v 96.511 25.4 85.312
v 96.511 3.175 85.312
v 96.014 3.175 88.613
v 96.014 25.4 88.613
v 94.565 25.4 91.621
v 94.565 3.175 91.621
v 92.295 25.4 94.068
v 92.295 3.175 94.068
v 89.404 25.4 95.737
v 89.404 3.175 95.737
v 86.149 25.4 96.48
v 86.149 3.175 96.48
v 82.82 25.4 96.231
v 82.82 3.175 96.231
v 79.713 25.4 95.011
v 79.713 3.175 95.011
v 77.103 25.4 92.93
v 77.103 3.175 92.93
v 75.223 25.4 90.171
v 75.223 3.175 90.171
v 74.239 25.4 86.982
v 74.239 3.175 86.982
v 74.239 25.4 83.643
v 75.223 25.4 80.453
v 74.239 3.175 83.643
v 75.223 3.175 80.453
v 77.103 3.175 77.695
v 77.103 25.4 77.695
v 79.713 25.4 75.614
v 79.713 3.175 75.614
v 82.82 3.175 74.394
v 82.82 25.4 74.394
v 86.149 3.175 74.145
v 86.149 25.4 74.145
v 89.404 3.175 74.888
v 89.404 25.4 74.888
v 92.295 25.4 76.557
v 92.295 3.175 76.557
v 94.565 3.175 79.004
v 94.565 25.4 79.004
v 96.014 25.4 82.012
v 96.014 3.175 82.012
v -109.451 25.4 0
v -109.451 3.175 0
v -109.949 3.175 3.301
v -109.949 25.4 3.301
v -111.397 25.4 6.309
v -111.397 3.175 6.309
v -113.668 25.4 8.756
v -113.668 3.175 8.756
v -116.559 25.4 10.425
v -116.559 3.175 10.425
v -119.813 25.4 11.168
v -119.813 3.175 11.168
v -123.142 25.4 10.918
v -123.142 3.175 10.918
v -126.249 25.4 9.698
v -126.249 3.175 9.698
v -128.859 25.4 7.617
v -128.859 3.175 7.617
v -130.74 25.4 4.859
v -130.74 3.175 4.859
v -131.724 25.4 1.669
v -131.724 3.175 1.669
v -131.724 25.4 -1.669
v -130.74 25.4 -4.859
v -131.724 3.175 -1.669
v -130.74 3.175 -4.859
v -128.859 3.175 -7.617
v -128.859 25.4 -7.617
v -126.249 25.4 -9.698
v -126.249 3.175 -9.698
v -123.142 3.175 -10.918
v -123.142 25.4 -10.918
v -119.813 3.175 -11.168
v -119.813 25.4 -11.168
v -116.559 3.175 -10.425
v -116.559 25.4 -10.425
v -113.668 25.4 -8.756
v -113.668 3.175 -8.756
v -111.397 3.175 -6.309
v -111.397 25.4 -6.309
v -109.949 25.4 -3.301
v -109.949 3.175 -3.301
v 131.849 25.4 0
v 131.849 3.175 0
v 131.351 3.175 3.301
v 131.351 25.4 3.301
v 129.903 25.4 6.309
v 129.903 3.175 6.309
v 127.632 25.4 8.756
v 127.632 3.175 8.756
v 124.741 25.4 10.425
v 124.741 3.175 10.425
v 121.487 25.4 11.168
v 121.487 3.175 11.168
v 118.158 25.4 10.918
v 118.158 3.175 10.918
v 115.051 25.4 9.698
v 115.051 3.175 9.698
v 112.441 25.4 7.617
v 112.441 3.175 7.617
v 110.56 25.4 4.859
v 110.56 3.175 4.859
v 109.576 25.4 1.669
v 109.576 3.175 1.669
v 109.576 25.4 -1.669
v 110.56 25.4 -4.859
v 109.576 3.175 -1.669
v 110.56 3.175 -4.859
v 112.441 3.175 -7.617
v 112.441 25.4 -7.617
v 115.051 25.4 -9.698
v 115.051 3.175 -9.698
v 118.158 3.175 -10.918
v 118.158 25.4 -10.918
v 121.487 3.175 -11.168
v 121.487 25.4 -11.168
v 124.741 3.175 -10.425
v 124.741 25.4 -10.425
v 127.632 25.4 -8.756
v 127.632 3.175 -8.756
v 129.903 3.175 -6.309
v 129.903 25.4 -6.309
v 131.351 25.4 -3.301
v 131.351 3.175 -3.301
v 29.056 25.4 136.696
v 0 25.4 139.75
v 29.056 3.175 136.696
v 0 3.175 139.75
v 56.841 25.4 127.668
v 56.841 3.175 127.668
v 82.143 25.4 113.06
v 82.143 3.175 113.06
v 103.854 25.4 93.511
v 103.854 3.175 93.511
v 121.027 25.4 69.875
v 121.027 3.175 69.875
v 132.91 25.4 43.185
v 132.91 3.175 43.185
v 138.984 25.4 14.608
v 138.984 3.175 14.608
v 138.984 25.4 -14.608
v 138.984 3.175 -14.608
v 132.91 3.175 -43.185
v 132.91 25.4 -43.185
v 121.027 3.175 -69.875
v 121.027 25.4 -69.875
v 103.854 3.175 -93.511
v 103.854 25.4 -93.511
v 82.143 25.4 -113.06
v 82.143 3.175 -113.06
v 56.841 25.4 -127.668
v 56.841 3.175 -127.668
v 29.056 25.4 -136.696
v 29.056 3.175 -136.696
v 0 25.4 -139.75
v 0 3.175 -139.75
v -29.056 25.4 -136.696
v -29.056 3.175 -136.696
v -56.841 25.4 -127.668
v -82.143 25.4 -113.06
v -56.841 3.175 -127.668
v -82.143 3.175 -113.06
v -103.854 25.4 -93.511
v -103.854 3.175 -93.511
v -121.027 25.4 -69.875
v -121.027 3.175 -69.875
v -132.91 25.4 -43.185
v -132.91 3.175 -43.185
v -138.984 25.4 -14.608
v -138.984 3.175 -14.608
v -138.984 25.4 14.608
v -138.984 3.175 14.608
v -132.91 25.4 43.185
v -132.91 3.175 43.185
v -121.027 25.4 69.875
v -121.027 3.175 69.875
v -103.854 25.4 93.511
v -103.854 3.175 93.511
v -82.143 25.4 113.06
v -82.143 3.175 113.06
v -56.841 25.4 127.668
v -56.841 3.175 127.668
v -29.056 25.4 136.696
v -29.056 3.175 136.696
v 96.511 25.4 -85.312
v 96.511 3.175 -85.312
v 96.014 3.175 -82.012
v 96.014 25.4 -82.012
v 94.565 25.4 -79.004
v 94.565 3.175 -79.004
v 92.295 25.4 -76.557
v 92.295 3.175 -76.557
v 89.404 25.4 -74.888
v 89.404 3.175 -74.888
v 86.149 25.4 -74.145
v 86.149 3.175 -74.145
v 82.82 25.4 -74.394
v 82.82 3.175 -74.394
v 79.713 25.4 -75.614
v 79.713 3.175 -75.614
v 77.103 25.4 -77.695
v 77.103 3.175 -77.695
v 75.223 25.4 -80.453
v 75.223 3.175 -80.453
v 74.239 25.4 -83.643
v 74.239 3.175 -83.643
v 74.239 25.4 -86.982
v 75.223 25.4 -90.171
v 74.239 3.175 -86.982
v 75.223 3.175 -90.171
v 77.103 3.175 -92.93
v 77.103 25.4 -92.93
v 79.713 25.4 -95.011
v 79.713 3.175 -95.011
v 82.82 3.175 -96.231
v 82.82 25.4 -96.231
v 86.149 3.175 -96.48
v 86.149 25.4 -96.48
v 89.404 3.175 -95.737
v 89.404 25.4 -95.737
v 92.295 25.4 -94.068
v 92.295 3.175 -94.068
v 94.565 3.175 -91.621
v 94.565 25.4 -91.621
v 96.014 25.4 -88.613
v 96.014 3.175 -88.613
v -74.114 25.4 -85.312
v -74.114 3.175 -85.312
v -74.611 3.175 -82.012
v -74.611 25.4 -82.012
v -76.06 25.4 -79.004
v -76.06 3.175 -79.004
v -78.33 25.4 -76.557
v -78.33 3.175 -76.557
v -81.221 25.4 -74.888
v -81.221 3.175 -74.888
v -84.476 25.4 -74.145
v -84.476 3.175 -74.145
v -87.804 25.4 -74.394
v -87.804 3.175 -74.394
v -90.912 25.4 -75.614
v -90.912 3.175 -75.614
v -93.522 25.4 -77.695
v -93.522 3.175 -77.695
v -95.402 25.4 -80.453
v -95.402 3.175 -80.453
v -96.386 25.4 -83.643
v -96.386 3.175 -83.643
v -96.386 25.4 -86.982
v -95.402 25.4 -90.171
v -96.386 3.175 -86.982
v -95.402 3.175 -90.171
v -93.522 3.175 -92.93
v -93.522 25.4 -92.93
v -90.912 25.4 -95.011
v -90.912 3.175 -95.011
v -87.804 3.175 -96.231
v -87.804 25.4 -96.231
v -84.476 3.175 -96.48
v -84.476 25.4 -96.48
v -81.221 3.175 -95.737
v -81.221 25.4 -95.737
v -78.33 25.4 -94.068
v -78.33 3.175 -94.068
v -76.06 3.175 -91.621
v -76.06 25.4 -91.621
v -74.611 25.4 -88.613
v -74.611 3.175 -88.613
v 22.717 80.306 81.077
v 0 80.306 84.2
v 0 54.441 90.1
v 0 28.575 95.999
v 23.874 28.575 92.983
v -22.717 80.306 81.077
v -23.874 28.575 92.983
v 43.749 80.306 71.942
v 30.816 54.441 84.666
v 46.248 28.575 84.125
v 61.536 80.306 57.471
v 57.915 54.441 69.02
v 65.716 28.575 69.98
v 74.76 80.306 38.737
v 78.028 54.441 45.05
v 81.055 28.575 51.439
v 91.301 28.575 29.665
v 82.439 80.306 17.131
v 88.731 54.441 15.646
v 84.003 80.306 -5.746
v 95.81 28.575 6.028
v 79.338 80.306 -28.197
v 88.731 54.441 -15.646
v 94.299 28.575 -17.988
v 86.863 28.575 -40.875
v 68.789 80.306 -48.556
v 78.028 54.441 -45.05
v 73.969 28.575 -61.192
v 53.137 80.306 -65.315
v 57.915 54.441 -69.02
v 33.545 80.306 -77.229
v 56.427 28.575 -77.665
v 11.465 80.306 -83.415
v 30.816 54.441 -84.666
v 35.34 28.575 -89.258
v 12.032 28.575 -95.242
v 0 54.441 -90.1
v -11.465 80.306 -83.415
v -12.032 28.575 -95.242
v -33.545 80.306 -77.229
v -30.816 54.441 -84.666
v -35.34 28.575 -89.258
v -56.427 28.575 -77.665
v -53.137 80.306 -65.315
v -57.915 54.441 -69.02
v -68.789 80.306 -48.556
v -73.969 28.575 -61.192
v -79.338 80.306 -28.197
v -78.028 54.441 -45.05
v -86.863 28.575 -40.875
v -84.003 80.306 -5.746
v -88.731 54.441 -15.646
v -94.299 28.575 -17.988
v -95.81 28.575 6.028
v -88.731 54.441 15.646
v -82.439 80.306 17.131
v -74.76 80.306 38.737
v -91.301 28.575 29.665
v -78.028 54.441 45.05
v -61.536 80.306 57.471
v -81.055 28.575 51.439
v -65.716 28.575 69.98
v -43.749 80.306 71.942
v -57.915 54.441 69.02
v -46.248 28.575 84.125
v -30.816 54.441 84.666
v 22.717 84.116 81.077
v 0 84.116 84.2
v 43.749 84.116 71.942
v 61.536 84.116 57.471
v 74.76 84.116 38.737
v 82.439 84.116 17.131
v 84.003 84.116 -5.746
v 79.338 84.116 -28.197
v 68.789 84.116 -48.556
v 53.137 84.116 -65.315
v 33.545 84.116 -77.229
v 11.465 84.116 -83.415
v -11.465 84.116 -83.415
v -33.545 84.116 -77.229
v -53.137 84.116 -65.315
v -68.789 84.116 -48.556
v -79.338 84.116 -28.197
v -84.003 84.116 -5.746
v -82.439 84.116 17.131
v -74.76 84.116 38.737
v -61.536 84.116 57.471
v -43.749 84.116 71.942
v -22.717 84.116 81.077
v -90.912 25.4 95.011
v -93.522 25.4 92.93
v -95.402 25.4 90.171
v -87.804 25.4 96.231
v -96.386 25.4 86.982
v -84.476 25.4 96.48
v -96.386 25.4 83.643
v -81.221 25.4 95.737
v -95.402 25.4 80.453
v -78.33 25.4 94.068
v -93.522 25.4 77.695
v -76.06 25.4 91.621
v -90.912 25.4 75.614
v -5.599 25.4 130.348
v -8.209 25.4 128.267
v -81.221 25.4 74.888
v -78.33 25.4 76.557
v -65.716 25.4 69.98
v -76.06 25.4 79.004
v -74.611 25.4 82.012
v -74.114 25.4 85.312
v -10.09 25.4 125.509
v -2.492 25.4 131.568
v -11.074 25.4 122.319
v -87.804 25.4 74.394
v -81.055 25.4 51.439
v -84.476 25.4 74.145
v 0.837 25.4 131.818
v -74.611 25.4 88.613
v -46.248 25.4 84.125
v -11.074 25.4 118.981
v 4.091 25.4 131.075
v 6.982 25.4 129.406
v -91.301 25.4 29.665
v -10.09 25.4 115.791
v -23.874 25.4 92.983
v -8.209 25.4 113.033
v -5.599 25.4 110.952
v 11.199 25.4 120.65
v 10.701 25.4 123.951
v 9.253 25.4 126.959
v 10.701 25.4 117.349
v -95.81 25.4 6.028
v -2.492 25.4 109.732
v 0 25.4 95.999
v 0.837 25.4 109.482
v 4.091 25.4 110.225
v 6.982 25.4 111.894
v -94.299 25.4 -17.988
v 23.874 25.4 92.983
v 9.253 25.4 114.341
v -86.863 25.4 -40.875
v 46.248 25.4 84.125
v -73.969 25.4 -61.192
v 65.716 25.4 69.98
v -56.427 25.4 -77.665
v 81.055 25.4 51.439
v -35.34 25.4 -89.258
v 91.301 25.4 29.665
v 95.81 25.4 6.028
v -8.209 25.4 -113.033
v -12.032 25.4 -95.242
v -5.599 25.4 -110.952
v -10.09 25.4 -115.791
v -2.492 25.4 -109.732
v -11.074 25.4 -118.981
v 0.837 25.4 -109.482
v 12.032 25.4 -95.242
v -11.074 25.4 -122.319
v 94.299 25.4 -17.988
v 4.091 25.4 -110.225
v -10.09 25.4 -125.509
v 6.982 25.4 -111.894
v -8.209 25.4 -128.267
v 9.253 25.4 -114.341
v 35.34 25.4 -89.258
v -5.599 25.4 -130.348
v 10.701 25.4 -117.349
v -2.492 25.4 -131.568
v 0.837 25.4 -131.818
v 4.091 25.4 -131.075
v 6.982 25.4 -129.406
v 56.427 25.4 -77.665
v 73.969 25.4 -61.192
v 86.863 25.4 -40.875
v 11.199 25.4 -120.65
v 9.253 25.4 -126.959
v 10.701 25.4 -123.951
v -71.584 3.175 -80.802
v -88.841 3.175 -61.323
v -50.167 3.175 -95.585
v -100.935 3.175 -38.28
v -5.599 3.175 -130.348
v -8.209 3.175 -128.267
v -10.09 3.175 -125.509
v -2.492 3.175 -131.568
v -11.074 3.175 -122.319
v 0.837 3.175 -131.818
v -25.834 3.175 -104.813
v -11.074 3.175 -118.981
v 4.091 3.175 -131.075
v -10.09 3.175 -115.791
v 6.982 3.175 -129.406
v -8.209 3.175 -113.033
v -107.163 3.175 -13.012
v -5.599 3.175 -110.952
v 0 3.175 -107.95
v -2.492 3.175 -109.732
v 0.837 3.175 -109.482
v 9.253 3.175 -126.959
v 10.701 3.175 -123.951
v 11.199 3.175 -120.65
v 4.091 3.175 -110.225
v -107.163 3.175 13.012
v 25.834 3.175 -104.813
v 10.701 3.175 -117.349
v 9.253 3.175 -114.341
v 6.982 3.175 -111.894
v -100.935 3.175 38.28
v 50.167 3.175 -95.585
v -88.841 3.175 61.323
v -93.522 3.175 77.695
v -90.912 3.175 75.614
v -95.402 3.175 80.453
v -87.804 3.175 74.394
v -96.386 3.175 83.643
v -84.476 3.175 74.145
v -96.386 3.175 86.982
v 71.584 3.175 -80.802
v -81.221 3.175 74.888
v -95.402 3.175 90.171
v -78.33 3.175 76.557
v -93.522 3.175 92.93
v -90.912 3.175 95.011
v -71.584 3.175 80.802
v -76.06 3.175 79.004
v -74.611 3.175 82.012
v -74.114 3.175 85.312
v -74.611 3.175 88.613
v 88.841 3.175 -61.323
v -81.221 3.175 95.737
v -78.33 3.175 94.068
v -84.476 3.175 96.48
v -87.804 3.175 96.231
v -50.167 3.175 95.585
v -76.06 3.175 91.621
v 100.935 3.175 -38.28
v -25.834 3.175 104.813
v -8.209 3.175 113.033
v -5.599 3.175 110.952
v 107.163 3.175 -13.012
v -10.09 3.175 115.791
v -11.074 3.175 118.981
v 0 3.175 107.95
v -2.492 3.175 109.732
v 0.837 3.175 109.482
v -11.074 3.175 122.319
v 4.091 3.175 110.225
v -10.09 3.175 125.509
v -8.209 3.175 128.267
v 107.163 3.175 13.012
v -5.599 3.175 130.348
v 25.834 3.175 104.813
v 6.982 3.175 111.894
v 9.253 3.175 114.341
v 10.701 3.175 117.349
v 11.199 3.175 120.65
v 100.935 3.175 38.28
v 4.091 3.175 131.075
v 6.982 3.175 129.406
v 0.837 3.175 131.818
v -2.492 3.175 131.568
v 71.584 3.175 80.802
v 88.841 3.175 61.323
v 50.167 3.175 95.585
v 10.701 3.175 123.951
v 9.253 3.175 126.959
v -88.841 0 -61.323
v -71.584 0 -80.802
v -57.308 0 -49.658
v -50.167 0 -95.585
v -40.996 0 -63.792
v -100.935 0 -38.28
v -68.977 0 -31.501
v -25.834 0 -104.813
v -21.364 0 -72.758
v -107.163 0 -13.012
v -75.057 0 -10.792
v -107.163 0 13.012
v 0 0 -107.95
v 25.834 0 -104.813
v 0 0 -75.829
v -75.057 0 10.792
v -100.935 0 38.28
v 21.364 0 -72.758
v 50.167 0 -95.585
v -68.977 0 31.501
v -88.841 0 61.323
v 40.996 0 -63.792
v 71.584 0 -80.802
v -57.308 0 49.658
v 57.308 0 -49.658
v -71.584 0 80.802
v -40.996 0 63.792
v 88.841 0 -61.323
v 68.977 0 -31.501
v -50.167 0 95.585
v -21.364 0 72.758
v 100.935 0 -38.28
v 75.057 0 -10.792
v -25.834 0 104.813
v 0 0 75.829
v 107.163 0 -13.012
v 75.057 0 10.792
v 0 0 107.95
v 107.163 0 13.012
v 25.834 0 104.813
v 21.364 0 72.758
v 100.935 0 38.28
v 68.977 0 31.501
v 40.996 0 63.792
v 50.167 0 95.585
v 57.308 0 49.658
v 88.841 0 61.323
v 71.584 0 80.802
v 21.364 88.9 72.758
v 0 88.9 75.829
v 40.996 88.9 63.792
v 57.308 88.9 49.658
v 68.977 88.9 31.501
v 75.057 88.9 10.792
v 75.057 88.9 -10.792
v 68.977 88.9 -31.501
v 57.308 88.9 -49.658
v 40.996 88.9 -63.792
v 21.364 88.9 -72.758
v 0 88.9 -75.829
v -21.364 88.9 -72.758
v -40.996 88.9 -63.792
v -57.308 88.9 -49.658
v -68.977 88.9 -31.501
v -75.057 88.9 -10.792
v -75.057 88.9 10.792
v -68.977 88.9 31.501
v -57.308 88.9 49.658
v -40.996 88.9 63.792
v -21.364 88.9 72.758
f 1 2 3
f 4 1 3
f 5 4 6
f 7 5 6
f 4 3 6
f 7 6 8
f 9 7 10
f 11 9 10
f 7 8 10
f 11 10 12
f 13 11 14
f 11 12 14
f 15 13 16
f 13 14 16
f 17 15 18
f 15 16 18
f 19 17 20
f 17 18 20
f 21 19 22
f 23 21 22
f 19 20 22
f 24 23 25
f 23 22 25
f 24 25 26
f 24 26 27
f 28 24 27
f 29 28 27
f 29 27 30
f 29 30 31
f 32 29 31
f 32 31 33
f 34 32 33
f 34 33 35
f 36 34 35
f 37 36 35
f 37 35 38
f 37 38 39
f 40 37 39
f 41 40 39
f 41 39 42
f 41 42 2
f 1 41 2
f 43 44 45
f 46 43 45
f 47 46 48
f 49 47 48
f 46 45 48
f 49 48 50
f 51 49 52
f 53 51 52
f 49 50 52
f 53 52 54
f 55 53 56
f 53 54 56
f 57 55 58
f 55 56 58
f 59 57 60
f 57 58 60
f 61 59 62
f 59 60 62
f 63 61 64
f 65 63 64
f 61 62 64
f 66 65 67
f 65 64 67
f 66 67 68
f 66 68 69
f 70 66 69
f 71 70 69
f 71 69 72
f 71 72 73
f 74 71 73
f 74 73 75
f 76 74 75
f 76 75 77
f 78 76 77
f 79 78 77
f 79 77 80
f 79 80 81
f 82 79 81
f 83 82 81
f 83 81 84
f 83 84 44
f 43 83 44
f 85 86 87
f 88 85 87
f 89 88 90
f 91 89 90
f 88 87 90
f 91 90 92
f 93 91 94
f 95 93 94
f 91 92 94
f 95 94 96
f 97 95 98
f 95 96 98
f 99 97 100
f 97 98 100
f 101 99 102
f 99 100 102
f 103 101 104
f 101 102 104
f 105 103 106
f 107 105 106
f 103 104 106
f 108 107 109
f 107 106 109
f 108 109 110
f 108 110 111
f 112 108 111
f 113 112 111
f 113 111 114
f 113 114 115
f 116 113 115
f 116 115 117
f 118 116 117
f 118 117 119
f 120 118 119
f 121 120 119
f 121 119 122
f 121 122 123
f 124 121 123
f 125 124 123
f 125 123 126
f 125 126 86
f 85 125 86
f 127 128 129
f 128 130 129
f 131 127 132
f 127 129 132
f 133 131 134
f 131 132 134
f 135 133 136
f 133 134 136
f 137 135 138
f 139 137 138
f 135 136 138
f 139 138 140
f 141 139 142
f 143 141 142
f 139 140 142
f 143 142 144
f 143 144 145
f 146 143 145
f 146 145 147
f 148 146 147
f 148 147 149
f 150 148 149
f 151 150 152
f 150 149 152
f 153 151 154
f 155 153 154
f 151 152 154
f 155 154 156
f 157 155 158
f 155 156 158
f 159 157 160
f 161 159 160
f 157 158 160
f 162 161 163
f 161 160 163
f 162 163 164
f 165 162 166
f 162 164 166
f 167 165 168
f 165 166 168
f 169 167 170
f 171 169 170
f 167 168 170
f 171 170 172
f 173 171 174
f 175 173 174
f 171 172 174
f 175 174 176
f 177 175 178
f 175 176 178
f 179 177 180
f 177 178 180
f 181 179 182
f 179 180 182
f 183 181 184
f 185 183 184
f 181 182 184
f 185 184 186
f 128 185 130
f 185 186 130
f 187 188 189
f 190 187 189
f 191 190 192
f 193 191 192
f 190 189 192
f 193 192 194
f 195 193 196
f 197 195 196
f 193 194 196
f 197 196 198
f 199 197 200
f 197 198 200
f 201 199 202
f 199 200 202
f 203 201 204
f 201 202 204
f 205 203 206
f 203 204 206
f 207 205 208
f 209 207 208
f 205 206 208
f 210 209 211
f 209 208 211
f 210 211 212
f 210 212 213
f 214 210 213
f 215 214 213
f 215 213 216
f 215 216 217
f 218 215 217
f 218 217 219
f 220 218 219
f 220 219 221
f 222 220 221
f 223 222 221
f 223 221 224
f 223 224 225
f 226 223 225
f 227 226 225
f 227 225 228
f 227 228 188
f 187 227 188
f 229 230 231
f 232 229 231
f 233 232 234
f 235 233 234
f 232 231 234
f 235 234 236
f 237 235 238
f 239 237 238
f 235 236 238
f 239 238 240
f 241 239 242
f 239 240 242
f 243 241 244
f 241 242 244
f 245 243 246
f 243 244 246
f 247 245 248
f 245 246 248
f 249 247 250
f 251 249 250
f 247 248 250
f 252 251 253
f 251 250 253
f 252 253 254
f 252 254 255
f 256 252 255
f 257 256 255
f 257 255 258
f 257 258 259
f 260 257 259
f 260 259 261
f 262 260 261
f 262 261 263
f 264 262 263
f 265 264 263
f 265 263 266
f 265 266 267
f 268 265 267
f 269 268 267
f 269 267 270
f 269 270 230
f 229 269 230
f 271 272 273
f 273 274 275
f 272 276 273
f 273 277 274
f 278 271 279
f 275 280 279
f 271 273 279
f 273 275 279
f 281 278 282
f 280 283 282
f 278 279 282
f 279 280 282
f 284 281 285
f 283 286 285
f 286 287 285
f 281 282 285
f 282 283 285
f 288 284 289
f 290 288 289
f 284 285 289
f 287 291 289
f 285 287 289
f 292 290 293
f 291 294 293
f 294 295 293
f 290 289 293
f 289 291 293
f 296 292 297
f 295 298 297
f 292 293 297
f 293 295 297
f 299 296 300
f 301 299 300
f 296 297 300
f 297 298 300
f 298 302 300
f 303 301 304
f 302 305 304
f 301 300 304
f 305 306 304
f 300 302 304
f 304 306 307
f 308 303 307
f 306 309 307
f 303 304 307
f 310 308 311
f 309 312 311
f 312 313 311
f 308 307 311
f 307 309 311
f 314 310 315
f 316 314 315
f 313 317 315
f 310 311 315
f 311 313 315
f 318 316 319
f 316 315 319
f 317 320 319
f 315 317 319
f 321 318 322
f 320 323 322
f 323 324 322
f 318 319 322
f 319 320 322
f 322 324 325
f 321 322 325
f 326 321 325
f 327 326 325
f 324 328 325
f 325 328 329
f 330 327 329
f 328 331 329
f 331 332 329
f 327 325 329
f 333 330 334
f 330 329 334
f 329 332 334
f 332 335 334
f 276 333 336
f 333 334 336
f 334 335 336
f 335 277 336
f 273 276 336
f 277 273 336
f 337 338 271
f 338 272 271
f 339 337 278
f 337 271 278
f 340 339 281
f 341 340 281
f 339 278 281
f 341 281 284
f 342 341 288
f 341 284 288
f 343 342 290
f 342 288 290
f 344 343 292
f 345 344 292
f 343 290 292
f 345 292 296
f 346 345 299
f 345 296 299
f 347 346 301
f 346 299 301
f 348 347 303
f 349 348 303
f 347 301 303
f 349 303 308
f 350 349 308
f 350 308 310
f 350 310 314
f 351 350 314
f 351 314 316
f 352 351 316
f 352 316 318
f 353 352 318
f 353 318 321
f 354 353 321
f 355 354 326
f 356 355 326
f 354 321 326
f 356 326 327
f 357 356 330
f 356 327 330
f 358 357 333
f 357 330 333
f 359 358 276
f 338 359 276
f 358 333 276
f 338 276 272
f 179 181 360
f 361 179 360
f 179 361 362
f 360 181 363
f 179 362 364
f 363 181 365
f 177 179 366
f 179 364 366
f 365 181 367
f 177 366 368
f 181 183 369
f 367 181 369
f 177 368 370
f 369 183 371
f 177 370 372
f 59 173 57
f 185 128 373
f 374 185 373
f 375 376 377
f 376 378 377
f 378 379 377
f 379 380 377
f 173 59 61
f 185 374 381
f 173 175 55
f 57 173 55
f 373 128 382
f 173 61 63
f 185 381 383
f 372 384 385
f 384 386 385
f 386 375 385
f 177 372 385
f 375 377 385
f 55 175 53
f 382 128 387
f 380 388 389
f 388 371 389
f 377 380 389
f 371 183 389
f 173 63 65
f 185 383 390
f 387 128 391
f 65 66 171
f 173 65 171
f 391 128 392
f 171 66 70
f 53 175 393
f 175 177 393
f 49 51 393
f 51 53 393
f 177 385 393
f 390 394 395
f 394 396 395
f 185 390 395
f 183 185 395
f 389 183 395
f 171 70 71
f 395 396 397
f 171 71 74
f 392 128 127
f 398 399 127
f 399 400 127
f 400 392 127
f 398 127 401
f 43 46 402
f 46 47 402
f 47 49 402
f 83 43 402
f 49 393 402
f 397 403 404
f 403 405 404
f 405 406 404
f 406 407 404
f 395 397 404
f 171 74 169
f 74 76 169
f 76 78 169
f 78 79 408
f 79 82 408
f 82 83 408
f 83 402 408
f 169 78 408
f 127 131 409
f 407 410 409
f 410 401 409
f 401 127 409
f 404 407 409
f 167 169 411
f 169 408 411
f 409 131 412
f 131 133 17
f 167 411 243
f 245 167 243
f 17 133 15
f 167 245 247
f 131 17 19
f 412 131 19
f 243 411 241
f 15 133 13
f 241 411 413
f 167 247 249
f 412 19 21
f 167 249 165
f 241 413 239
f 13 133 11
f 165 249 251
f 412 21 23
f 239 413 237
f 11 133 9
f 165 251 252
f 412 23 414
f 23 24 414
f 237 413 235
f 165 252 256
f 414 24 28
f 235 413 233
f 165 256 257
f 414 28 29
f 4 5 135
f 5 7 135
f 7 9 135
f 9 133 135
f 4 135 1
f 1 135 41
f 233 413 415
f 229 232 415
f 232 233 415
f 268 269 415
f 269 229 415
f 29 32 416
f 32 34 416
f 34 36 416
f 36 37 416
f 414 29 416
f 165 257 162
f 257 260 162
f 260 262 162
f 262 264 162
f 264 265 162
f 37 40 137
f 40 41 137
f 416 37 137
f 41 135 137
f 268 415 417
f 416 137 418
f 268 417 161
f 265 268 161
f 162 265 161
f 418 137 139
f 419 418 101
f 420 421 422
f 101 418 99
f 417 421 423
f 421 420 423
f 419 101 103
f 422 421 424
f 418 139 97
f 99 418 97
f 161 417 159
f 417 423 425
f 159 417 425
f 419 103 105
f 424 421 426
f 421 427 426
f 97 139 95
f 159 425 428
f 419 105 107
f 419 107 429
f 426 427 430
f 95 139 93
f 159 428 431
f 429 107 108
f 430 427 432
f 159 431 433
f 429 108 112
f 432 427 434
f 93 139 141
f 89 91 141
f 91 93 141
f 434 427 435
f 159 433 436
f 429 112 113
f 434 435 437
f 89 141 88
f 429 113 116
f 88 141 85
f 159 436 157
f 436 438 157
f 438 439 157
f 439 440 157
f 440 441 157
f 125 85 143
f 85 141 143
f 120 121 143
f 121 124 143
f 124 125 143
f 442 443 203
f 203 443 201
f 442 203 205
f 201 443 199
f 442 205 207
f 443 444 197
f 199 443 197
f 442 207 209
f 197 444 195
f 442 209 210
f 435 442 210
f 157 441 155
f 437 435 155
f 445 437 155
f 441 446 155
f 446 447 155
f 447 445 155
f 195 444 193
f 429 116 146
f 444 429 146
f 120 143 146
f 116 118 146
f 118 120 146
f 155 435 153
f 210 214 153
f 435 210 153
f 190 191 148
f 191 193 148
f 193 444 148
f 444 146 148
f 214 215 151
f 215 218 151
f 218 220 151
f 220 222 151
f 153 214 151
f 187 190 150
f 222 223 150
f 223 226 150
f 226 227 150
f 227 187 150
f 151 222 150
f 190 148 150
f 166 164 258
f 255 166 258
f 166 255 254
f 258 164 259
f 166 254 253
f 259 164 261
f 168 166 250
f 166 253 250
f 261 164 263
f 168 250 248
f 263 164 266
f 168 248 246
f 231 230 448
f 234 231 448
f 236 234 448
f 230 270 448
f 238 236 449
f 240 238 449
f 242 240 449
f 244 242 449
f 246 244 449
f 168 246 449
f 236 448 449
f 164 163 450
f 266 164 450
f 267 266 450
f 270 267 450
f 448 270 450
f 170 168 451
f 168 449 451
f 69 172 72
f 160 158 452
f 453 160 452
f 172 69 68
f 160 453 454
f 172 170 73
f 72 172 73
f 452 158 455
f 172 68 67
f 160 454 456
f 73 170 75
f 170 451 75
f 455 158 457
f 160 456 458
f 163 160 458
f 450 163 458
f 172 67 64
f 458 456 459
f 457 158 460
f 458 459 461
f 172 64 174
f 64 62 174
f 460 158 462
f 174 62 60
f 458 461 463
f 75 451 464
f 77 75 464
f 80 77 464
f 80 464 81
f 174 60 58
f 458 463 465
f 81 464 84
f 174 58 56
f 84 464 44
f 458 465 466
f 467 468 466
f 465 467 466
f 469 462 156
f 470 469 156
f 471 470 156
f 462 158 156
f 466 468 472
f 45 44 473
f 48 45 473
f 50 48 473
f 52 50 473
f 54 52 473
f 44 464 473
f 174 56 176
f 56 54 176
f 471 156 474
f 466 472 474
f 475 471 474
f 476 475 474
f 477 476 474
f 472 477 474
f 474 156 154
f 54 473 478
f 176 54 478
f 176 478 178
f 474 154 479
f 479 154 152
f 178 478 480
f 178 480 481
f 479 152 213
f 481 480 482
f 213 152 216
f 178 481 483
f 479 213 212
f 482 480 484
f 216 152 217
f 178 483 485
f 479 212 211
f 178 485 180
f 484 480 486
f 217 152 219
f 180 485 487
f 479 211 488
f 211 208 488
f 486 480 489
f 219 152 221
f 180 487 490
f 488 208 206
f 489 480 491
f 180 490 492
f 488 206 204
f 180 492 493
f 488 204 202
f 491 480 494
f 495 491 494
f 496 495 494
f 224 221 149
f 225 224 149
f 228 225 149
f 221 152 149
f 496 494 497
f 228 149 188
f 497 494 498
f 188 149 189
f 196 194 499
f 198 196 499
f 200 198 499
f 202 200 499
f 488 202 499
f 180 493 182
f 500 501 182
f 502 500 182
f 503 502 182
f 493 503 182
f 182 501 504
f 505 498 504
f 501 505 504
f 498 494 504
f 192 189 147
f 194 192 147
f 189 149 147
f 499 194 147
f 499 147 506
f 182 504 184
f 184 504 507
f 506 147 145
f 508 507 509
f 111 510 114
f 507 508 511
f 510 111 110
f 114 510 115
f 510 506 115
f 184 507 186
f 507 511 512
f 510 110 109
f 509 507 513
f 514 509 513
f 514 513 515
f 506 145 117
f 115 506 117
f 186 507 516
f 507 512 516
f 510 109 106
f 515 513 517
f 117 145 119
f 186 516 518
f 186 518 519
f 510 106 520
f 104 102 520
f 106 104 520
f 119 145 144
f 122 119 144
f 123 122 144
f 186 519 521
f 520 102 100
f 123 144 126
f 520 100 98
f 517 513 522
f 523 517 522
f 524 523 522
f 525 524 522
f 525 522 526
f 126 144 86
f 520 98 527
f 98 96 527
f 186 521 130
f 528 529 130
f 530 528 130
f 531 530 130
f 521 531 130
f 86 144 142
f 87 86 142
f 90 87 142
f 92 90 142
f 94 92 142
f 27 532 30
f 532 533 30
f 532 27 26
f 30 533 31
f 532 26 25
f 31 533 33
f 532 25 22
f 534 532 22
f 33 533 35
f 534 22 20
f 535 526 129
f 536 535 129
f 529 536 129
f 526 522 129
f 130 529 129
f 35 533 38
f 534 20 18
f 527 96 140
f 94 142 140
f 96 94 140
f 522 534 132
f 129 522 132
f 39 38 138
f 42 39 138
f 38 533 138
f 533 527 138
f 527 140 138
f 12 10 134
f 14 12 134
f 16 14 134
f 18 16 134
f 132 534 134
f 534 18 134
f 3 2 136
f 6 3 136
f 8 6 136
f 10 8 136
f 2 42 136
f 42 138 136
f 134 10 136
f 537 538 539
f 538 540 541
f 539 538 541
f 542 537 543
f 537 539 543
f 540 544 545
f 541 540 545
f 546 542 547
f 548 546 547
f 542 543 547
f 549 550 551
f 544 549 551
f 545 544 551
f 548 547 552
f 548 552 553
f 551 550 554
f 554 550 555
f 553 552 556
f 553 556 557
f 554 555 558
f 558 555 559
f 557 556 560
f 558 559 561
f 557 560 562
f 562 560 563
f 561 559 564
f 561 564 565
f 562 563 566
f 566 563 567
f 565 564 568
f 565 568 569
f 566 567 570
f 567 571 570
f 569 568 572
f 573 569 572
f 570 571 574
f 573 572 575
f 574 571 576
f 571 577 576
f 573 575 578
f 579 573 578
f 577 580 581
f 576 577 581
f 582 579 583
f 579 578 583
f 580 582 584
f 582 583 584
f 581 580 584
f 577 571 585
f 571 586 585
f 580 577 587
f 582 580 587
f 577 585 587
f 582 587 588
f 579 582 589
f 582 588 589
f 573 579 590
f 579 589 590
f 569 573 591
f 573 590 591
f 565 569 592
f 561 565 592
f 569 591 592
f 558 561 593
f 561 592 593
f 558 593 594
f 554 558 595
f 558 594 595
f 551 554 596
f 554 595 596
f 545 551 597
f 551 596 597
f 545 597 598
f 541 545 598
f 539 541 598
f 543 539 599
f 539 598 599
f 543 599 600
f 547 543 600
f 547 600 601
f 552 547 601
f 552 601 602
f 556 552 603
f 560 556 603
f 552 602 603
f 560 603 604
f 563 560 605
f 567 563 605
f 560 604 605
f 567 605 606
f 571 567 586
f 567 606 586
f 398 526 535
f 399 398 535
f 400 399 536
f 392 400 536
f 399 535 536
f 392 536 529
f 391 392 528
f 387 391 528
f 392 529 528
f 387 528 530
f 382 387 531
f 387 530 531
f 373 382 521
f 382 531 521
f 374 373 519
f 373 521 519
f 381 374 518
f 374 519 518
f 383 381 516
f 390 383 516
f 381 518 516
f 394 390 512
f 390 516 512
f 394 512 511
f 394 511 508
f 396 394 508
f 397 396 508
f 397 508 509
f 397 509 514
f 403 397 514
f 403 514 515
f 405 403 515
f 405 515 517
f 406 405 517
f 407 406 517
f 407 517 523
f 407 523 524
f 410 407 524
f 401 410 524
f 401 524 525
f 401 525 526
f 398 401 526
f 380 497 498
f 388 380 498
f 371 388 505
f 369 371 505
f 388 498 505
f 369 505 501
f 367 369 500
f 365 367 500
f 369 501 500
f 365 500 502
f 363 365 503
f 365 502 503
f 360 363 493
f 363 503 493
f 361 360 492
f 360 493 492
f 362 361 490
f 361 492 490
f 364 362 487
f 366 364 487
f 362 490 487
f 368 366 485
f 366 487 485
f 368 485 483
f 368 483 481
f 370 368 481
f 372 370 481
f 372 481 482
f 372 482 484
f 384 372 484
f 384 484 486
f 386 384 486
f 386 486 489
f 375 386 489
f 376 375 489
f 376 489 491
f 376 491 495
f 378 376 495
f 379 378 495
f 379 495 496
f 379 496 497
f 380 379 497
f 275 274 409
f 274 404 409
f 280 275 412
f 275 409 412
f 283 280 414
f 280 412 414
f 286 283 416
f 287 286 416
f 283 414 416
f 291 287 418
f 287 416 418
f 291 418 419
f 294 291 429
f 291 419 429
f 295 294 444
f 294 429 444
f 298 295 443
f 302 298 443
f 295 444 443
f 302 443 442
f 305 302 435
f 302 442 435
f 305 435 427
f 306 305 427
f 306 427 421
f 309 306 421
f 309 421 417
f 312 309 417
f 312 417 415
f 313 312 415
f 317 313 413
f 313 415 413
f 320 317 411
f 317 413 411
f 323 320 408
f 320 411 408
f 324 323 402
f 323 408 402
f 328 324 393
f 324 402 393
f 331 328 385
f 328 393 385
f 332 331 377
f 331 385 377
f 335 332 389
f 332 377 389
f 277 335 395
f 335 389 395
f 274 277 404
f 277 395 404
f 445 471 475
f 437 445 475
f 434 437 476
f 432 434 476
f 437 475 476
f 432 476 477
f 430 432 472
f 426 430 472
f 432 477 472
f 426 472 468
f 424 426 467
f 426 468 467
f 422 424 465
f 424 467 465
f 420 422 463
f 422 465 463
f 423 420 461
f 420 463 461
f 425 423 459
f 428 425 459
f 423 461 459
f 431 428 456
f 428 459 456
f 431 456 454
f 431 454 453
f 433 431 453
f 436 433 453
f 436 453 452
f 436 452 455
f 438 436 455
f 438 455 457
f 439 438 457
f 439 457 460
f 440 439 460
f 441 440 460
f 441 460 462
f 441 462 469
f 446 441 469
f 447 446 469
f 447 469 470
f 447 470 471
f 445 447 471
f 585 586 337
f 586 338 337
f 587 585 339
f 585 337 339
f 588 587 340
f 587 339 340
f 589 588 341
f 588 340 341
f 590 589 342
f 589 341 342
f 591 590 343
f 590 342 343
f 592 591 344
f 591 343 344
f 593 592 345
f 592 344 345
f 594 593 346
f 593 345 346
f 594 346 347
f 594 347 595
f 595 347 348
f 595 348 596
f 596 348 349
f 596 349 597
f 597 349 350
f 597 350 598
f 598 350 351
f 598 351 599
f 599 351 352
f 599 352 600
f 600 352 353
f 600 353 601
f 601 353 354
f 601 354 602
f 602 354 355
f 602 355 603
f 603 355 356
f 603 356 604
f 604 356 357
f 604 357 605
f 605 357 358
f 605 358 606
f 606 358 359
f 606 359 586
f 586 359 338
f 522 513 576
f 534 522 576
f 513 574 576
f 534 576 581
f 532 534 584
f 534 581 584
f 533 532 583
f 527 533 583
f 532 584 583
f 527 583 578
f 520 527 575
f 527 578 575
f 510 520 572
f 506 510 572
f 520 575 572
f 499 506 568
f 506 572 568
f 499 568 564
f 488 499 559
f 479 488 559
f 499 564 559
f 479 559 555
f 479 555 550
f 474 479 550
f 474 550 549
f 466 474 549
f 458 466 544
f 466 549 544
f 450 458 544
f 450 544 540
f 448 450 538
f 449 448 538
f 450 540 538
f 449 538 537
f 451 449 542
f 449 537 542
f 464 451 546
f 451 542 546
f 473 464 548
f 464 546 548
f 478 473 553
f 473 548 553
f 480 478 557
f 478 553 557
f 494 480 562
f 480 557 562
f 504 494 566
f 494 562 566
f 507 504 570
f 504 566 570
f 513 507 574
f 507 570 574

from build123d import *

# Parameters (mm, degrees)
F2_R     = 11.19886
F3_DEPTH = 85.726


with BuildPart() as f1:
    # F0 (on Right) → F1 (revolve)
    with BuildSketch(Plane.YZ):
        Polygon((0, 107.95), (0, 75.82916), (88.9, 75.82916), (84.116041, 84.19973), (80.306041, 84.19973), (28.575, 95.9993), (25.4, 95.9993), (25.4, 139.74953), (3.175, 139.74953), (3.175, 107.95), align=None)
    revolve(axis=Axis((0, -0.252383, 0), (0, 1, 0)))

    # F2 (on face) → F3 (cut, through all)
    with BuildSketch(Plane.XZ.offset(-3.175)):
        with Locations((-85.312433, 85.312433)):
            Circle(F2_R)
        with Locations((0, 120.65)):
            Circle(F2_R)
        with Locations((85.312433, 85.312433)):
            Circle(F2_R)
        with Locations((120.65, 0)):
            Circle(F2_R)
        with Locations((85.312433, -85.312433)):
            Circle(F2_R)
        with Locations((0, -120.65)):
            Circle(F2_R)
        with Locations((-85.312433, -85.312433)):
            Circle(F2_R)
        with Locations((-120.65, 0)):
            Circle(F2_R)
    extrude(amount=-F3_DEPTH, mode=Mode.SUBTRACT)


solid = f1.part
